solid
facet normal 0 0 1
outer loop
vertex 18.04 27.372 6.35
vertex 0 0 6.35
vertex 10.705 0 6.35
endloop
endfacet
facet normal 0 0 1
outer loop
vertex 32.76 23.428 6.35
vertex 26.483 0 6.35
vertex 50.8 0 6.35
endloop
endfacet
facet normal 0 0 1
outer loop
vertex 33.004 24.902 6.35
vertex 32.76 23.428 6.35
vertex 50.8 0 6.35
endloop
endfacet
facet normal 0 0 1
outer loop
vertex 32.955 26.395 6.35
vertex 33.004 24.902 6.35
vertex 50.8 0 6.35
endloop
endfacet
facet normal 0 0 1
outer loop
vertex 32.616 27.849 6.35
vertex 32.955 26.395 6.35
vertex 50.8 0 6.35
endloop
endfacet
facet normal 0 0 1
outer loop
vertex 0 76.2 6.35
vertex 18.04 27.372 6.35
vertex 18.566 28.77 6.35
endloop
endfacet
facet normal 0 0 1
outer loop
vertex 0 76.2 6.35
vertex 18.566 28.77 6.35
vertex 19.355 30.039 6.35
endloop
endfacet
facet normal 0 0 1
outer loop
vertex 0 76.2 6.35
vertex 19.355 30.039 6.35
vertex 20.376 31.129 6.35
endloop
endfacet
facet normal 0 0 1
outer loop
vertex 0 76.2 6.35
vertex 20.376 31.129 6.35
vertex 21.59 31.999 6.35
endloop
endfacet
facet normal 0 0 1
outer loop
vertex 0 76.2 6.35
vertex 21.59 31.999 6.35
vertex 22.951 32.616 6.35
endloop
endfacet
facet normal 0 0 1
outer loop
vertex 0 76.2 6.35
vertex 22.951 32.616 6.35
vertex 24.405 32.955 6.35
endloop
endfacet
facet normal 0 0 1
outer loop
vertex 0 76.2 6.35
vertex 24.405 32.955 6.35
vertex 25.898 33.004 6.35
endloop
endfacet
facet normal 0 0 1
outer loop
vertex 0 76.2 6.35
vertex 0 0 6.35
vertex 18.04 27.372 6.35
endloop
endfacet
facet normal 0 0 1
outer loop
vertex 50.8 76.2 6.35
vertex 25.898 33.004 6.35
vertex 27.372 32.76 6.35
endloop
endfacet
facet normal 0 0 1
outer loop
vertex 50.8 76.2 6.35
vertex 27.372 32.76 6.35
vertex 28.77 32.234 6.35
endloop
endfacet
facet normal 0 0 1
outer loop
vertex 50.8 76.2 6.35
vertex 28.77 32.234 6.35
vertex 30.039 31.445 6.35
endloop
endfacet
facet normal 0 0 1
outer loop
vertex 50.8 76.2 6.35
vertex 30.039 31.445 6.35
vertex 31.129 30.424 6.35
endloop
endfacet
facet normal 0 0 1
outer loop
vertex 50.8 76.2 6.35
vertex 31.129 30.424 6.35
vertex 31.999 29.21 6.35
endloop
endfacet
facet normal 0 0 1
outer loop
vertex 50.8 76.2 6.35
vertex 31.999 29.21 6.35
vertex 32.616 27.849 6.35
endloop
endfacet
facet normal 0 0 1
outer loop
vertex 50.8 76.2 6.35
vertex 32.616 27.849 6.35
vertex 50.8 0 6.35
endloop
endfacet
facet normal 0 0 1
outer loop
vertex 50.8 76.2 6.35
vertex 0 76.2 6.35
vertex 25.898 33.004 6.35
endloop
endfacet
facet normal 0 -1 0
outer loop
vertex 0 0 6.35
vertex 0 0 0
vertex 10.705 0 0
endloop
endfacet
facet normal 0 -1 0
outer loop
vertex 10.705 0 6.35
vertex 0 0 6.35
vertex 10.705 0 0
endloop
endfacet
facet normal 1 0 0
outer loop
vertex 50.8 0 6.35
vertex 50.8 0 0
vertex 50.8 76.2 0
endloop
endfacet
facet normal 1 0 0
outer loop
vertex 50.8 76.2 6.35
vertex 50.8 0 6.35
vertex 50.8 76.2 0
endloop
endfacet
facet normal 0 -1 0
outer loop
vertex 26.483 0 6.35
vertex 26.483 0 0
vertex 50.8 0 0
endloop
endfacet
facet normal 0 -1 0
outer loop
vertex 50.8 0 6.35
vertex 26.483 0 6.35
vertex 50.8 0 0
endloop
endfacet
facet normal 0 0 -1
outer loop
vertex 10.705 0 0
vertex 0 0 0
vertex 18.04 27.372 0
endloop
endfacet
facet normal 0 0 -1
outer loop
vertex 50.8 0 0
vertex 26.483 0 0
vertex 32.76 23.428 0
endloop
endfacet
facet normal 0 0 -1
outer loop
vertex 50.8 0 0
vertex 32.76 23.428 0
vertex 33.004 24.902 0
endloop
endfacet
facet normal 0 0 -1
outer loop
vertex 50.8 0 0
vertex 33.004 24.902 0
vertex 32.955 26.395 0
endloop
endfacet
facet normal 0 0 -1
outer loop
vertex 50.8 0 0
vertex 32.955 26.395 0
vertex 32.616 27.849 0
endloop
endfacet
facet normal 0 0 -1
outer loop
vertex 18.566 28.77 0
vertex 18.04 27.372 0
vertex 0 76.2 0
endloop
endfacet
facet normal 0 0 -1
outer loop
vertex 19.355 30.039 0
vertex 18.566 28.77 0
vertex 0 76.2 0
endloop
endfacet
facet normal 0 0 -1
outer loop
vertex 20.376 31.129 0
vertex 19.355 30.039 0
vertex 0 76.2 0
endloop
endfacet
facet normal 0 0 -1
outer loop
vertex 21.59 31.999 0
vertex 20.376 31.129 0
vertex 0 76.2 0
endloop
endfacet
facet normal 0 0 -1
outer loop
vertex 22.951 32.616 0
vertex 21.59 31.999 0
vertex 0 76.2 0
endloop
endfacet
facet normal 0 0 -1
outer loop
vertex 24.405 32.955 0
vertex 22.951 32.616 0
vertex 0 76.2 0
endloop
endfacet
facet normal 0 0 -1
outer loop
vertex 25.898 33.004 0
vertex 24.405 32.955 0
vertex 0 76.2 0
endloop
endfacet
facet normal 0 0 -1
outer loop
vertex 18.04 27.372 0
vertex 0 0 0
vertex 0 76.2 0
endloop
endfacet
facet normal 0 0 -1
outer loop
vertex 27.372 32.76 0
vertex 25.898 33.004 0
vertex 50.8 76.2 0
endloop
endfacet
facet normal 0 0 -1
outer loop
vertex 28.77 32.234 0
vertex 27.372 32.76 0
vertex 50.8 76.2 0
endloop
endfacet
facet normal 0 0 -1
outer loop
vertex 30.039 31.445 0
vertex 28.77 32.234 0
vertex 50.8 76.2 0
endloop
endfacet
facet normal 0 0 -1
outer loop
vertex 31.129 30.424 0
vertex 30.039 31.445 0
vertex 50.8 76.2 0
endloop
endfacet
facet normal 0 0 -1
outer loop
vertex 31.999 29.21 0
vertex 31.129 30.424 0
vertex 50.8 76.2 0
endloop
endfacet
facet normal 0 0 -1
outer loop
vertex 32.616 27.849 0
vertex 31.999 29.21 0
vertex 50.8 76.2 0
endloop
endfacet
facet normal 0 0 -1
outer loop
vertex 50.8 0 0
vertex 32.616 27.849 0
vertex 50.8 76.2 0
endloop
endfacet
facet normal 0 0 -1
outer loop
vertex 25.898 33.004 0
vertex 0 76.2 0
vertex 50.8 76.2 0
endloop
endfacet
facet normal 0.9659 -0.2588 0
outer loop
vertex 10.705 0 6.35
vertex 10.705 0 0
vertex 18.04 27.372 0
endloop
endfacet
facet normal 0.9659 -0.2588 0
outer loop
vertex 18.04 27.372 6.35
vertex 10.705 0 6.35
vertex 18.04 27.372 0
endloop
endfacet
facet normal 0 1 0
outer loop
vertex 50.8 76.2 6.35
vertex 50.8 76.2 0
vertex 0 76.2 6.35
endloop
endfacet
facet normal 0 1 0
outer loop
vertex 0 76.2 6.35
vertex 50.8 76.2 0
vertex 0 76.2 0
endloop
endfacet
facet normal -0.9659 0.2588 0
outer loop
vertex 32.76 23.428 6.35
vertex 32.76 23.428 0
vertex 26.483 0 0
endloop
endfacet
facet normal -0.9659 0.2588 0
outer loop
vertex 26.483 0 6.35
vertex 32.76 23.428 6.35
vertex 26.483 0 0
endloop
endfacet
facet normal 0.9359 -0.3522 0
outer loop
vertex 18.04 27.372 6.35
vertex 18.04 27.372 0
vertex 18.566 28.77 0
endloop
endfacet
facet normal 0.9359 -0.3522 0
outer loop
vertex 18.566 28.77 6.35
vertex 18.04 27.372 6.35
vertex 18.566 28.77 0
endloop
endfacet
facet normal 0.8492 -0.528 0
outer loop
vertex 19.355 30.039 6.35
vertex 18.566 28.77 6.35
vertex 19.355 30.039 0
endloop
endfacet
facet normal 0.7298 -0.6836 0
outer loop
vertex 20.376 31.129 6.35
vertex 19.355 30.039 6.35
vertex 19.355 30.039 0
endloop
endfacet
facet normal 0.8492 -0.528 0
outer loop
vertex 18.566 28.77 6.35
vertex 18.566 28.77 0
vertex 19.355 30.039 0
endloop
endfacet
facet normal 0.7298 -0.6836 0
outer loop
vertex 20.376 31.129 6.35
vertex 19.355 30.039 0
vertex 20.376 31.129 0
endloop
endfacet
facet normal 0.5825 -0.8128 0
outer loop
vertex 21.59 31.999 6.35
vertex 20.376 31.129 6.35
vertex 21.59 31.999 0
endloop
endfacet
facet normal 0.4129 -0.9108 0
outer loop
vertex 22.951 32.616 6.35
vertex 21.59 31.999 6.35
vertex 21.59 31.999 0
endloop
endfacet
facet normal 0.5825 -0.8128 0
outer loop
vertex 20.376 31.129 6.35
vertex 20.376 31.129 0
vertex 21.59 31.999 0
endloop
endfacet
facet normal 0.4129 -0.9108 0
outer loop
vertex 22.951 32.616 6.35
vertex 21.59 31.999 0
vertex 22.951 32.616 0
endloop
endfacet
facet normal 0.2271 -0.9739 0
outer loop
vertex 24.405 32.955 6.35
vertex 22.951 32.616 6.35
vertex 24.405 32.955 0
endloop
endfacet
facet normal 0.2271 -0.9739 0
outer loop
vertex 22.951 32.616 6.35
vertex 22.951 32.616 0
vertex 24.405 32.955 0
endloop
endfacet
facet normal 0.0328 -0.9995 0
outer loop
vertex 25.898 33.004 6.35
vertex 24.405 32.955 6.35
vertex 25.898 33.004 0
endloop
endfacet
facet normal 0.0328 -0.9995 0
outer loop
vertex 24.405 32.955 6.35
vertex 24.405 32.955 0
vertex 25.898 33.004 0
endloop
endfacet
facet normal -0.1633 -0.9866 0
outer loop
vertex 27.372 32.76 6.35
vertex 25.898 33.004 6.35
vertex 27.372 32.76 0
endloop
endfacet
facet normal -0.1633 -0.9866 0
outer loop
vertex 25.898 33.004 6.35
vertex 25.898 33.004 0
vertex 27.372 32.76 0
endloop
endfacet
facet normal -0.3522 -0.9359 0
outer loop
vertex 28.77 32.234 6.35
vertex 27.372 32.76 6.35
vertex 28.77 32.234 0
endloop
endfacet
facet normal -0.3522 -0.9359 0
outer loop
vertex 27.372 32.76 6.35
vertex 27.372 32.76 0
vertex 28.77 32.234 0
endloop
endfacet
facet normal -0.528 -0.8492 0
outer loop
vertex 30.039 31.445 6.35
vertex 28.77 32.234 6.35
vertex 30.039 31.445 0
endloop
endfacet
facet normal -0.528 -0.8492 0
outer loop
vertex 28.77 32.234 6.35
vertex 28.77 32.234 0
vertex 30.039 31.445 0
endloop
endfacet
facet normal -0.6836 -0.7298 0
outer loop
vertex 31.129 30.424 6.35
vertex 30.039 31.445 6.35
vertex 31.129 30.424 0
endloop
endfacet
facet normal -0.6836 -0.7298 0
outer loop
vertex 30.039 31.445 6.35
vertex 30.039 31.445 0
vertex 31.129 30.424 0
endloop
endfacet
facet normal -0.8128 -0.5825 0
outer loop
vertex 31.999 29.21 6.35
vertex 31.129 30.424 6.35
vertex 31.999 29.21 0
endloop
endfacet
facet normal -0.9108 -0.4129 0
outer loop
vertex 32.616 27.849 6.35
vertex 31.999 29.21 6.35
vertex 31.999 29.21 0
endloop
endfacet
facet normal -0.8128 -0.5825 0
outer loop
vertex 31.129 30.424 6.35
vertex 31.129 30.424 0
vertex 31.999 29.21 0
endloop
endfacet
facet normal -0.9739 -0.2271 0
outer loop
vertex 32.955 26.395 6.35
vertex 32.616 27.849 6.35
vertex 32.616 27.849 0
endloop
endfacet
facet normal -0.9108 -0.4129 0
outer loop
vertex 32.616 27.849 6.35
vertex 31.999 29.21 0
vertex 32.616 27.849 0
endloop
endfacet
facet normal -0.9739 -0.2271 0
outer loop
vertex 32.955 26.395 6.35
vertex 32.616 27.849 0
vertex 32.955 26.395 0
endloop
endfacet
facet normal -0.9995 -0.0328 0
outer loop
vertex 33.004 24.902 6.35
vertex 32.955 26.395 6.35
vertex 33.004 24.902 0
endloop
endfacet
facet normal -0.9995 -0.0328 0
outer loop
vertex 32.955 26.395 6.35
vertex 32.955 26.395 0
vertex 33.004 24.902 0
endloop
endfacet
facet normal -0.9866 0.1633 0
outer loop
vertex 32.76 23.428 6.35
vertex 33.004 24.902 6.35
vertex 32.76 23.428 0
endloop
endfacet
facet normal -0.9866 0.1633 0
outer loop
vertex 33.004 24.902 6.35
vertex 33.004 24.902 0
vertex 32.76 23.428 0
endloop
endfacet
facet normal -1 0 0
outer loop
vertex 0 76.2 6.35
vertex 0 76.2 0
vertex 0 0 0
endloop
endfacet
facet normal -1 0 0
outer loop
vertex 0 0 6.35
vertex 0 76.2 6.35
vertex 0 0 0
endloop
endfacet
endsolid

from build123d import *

# Parameters (mm, degrees)
BOSS_EXTRUDE1_DEPTH = 6.35


with BuildPart() as part:
    # Sketch1 → Boss-Extrude1 (new body)
    with BuildSketch(Plane.XY):
        with BuildLine():
            Line((10.705286018, 0), (18.039645204, 27.372201124))
            ThreePointArc((18.039645204, 27.372201124), (27.372201124, 32.760354796), (32.760354796, 23.427798876))
            Line((32.760354796, 23.427798876), (26.482895007, 0))
            Line((26.482895007, 0), (50.8, 0))
            Line((50.8, 0), (50.8, 76.2))
            Line((50.8, 76.2), (0, 76.2))
            Line((0, 76.2), (0, 0))
            Line((0, 0), (10.705286018, 0))
        make_face()
    extrude(amount=BOSS_EXTRUDE1_DEPTH)


solid = part.part
